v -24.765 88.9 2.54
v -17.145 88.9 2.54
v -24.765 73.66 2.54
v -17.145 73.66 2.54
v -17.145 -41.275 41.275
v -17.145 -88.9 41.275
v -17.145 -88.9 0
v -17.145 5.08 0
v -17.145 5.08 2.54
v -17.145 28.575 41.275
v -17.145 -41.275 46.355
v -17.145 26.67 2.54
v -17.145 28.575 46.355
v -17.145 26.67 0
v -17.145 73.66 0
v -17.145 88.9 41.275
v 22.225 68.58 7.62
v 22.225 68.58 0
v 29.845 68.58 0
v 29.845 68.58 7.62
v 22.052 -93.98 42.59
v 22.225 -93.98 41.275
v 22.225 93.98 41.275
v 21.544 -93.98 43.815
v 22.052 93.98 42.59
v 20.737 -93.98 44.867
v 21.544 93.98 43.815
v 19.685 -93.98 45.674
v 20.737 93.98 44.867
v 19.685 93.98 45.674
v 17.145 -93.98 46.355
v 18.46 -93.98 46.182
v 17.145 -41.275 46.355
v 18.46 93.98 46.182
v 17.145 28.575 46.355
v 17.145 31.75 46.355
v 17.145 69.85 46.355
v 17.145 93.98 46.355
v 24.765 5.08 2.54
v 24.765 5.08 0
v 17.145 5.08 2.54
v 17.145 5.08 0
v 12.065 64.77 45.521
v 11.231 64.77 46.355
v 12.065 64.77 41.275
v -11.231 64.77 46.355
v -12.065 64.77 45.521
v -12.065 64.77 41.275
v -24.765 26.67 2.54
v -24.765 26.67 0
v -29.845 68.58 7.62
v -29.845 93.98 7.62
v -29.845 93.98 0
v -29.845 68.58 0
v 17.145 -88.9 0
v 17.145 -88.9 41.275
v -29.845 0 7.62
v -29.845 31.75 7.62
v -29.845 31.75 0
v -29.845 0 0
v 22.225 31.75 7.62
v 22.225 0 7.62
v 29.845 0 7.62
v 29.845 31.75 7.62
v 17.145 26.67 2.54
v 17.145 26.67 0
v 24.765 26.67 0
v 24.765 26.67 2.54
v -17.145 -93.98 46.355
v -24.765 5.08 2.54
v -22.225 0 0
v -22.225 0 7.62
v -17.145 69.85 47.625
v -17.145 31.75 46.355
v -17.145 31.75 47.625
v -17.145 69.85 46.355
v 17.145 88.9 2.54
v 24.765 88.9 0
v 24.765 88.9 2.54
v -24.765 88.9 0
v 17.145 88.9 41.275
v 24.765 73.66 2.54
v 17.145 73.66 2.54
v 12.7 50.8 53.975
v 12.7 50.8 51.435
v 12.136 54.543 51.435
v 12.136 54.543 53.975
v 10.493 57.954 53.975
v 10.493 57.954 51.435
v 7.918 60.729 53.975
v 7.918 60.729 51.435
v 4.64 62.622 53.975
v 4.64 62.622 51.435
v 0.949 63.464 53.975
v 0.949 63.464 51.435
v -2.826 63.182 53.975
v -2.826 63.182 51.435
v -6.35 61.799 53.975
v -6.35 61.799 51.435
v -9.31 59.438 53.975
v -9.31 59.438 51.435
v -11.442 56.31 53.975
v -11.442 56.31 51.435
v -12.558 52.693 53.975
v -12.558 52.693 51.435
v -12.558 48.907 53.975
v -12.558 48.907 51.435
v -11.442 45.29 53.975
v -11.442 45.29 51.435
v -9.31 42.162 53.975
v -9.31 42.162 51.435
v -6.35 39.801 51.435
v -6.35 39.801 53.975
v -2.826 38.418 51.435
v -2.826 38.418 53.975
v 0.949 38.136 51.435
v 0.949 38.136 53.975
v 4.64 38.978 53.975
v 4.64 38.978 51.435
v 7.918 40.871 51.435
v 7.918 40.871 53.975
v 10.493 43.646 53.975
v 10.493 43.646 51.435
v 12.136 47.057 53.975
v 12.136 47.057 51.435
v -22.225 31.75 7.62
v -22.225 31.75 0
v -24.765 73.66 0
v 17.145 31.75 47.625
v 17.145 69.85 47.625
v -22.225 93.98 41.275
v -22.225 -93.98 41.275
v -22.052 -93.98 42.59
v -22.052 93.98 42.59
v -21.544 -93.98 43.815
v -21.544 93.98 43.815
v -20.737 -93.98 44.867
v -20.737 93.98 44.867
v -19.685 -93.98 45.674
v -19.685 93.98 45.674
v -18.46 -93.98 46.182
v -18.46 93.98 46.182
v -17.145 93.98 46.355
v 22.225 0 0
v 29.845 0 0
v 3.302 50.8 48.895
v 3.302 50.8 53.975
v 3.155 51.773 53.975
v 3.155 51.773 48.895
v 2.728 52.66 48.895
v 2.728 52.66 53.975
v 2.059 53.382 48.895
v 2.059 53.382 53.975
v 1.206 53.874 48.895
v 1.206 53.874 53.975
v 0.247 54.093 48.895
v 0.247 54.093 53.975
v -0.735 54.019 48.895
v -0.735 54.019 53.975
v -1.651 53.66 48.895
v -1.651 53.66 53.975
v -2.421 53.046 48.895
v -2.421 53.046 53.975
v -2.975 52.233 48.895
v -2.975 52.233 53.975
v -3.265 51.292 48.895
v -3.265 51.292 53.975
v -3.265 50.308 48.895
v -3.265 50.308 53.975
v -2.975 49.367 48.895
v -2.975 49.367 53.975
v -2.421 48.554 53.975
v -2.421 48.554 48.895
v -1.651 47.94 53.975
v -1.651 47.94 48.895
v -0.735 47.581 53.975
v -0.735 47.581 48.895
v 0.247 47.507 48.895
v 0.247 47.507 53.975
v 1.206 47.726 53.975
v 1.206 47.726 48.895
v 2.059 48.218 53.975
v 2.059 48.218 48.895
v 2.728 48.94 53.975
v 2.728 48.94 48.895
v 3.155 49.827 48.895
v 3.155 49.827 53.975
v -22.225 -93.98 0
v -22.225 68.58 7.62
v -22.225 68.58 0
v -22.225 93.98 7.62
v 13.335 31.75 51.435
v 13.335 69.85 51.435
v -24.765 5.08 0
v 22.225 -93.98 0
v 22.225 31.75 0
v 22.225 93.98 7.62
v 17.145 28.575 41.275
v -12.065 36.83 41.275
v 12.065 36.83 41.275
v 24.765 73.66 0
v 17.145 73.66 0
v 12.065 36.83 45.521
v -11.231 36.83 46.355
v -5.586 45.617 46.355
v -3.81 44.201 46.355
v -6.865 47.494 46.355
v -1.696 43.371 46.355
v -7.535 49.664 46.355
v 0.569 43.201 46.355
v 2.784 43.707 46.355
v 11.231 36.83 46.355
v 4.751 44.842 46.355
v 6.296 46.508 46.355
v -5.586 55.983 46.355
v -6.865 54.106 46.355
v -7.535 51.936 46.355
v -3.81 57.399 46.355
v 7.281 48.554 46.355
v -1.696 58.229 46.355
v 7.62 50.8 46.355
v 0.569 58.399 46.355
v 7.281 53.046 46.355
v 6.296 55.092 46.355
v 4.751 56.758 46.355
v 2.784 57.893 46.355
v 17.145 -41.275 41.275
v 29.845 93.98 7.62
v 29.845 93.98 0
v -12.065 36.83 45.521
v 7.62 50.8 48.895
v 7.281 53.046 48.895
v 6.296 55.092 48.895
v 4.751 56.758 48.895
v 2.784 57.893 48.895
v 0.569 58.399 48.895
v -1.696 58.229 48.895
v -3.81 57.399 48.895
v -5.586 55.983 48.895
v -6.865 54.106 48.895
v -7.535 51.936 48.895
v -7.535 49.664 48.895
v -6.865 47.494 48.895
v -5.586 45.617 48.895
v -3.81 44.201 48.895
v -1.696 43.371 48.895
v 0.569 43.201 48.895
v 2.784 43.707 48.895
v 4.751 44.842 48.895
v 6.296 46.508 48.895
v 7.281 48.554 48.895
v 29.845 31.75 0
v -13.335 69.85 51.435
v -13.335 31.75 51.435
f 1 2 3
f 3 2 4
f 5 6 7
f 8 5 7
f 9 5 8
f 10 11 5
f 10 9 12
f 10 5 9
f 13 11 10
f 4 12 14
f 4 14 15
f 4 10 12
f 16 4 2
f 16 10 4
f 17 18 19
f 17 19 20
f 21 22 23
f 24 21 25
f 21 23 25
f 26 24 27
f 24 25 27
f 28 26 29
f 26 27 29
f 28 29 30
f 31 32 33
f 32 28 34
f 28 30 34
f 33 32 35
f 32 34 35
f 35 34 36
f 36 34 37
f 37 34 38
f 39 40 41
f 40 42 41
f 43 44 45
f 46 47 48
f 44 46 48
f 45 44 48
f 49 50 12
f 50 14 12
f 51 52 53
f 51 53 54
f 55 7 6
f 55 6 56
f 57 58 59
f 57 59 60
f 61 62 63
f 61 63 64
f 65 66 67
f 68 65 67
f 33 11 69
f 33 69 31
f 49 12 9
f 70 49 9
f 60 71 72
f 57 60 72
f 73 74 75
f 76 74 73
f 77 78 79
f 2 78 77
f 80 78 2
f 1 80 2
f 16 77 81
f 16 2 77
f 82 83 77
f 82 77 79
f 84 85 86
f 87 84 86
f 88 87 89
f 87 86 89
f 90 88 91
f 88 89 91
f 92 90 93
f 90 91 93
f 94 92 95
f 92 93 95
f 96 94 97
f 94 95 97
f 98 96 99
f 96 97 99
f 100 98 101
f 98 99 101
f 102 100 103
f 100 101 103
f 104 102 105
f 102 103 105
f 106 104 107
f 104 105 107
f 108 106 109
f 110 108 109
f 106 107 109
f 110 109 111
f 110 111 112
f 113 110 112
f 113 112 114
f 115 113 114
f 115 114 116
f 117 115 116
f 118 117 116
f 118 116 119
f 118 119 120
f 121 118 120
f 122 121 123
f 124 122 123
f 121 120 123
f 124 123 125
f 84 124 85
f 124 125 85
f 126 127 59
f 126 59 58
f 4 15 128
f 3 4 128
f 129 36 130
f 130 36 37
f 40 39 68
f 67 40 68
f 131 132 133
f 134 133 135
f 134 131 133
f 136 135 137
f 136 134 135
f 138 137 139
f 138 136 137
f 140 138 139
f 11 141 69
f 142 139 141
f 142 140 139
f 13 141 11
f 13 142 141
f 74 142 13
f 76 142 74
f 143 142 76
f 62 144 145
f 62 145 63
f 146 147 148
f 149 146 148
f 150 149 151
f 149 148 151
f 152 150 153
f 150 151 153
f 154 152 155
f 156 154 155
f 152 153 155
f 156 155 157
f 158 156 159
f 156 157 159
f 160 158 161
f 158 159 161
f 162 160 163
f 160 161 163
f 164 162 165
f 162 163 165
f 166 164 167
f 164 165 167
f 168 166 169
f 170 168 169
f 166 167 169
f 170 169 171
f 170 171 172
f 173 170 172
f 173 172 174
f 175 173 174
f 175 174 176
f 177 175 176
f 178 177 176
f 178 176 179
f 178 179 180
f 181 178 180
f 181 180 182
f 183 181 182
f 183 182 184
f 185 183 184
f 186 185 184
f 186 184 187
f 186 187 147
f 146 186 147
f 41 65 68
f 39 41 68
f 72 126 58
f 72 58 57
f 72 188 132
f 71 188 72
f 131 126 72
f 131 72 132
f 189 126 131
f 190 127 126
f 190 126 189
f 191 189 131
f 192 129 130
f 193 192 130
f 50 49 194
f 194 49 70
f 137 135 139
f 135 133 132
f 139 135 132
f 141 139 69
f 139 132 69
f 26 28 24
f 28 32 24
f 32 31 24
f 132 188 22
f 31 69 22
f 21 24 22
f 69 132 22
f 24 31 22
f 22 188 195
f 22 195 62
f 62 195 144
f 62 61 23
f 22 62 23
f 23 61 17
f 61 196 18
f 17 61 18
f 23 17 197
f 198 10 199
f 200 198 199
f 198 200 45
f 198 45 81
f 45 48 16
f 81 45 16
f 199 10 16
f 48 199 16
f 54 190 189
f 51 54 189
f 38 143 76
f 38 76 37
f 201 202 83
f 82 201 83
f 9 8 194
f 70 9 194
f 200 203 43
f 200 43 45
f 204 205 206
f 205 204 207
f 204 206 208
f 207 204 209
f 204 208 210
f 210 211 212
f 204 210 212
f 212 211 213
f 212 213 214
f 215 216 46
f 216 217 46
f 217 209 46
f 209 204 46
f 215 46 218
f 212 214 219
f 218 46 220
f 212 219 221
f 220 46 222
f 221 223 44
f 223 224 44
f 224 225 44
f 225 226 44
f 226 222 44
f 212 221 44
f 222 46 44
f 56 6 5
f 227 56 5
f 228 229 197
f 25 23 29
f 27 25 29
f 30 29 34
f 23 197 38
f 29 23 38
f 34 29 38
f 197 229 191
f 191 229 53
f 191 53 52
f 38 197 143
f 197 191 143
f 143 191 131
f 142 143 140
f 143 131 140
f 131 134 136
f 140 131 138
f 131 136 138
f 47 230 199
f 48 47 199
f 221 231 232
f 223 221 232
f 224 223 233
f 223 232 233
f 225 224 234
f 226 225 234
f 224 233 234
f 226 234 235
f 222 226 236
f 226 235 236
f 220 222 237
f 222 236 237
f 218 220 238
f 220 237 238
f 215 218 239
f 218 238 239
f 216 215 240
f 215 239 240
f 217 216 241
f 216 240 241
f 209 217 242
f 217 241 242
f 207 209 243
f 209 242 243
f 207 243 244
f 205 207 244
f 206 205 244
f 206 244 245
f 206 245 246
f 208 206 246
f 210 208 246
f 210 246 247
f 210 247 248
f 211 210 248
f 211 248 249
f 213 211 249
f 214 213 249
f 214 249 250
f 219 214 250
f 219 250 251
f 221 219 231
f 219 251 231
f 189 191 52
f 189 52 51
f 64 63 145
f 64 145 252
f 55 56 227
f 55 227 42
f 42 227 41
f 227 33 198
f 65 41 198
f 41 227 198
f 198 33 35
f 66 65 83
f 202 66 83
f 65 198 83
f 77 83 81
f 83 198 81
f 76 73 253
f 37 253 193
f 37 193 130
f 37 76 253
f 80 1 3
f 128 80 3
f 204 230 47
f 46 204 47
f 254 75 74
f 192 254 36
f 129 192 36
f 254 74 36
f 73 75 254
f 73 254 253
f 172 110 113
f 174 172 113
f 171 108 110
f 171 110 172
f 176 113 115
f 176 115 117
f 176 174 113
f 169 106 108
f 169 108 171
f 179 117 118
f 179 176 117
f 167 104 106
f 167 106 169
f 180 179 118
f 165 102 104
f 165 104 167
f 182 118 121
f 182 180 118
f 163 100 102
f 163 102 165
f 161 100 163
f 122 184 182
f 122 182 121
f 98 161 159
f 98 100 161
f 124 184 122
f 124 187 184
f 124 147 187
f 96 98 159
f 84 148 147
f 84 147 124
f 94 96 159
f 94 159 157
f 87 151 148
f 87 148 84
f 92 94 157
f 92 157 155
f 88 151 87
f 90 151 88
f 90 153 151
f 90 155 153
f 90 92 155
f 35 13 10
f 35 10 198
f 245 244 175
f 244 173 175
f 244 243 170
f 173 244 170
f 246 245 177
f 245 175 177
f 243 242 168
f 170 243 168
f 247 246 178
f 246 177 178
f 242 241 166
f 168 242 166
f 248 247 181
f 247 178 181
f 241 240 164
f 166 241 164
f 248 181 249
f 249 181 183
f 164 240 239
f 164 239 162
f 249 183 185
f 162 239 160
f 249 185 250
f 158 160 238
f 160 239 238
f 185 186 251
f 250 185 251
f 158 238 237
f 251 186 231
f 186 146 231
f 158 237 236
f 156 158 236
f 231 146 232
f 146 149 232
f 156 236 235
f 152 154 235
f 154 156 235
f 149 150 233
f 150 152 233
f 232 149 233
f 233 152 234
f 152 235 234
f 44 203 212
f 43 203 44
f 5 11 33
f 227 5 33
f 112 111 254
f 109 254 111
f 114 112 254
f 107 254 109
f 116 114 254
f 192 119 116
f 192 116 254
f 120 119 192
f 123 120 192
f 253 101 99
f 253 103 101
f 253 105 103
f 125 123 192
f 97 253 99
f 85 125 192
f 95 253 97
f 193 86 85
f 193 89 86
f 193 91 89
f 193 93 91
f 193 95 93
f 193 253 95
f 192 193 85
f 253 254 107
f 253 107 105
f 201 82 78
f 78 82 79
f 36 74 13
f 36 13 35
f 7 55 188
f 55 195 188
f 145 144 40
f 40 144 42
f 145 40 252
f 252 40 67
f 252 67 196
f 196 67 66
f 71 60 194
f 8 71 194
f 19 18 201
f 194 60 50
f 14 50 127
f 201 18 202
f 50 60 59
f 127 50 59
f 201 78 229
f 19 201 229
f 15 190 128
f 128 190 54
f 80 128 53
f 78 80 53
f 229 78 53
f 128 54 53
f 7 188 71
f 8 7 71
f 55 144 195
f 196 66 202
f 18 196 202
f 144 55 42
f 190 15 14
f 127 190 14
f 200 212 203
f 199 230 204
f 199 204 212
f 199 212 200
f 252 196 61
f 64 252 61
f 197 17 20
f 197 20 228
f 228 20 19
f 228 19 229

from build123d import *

# Parameters (mm, degrees)
F0_W          = 44.45
F0_H          = 187.96
F1_DEPTH      = 46.355
F2_R          = 5.08
F3_W          = 34.29
F3_H          = 38.1
F4_DEPTH      = 5.08
F5_R          = 12.7
F6_DEPTH      = 2.54
F7_W          = 31.75
F7_H          = 7.62
F8_DEPTH      = 7.62
F9_W          = 31.75
F9_H          = 7.62
F10_DEPTH     = 7.62
F11_W         = 25.4
F11_H         = 7.62
F12_DEPTH     = 7.62
F13_W         = 25.4
F13_H         = 7.62
F14_DEPTH     = 7.62
F15_SIZE      = 3.81
F16_T         = 5.08
F16_T3_DEPTH  = 44.45
F16_T5_DEPTH  = 48.26
F16_T7_DEPTH  = 35.56
F16_T9_DEPTH  = 17.78
F16_T11_DEPTH = 41.91
F17_W         = 34.29
F17_H         = 69.85
F18_DEPTH     = 25.4
F19_R         = 3.302
F20_DEPTH     = 53.976


# Not quite as in the source:
# - a shell that OpenCascade refuses in one call is made with other operations: the cavity is built on its own and cut out


with BuildPart() as f1:
    # F0 (on Top) → F1 (new body)
    with BuildSketch(Plane.XY):
        Rectangle(F0_W, F0_H)
    extrude(amount=F1_DEPTH)

    # F2
    f2_edges = [f1.edges().sort_by_distance(p)[0] for p in [
        (22.225, 0, 46.355),
        (-22.225, 0, 46.355),
    ]]
    fillet(f2_edges, radius=F2_R)

    # F3 (on face) → F4 (join)
    with BuildSketch(Plane.XY.offset(46.355)):
        with Locations((0, 50.8)):
            Rectangle(F3_W, F3_H)
    extrude(amount=F4_DEPTH)

    # F5 (on face) → F6 (join)
    with BuildSketch(Plane.XY.offset(51.435)):
        with Locations((0, 50.8)):
            Circle(F5_R)
    extrude(amount=F6_DEPTH)

    # F7 (on face) → F8 (join)
    with BuildSketch(Plane.YZ.offset(22.225)):
        with Locations((15.875, 3.81)):
            Rectangle(F7_W, F7_H)
    extrude(amount=F8_DEPTH)

    # F9 (on face) → F10 (join)
    with BuildSketch(Plane(origin=(-22.225, 0, 0), x_dir=(0, -1, 0), z_dir=(-1, 0, 0))):
        with Locations((-15.875, 3.81)):
            Rectangle(F9_W, F9_H)
    extrude(amount=F10_DEPTH)

    # F11 (on face) → F12 (join)
    with BuildSketch(Plane(origin=(-22.225, 0, 0), x_dir=(0, -1, 0), z_dir=(-1, 0, 0))):
        with Locations((-81.28, 3.81)):
            Rectangle(F11_W, F11_H)
    extrude(amount=F12_DEPTH)

    # F13 (on face) → F14 (join)
    with BuildSketch(Plane.YZ.offset(22.225)):
        with Locations((81.28, 3.81)):
            Rectangle(F13_W, F13_H)
    extrude(amount=F14_DEPTH)

    # F15
    f15_edges = [f1.edges().sort_by_distance(p)[0] for p in [
        (-17.145, 50.8, 51.435),
        (17.145, 50.8, 51.435),
    ]]
    chamfer(f15_edges, length=F15_SIZE)

    # F16: shell of thickness 5.08, made by hand


with BuildPart() as f16_core1:
    # F16_t2: copy of F1
    add(f1.part)

    # the walls: a layer under each face that stays
    f16_faces = [f16_core1.faces().sort_by_distance(p)[0] for p in [
        (0, 31.75, 48.895),
        (-17.145, 50.8, 46.99),
        (-15.24, 50.8, 49.53),
        (0, -31.115, 46.355),
        (-8.89, 38.1, 51.435),
        (17.145, 50.8, 46.99),
        (15.24, 50.8, 49.53),
        (0, 69.85, 48.895),
        (0, -93.98, 23.1775),
        (-12.7, 50.8, 52.705),
        (0, 81.915, 46.355),
        (0, 93.98, 23.1775),
        (-22.225, 0, 20.6375),
        (22.225, 0, 20.6375),
        (0, 50.8, 53.975),
        (-26.035, 81.28, 7.62),
        (-29.845, 81.28, 3.81),
        (29.845, 81.28, 3.81),
        (26.035, 81.28, 7.62),
        (-26.035, 68.58, 3.81),
        (-26.035, 31.75, 3.81),
        (-26.035, 15.875, 7.62),
        (-26.035, 0, 3.81),
        (26.035, 0, 3.81),
        (26.035, 15.875, 7.62),
        (26.035, 31.75, 3.81),
        (26.035, 68.58, 3.81),
        (-29.845, 15.875, 3.81),
        (29.845, 15.875, 3.81),
    ]]
    thicken(f16_faces, amount=-F16_T, mode=Mode.SUBTRACT)

    # F16_s4 → F16_t3 (cut)
    with BuildSketch(Plane.YZ.offset(-22.225)):
        Polygon((31.6992, 46.4058), (36.83, 46.355), (36.83, 41.275), (31.75, 41.275), align=None)
        Polygon((69.9008, 46.4058), (64.77, 46.355), (64.77, 41.275), (69.85, 41.275), align=None)
    extrude(amount=F16_T3_DEPTH, mode=Mode.SUBTRACT)

    # F16_s6 → F16_t5 (cut)
    with BuildSketch(Plane.XZ.offset(-74.93)):
        Polygon((-17.1958, 46.4058), (-12.065, 46.355), (-12.065, 41.275), (-17.145, 41.275), align=None)
        Polygon((17.1958, 46.4058), (12.065, 46.355), (12.065, 41.275), (17.145, 41.275), align=None)
    extrude(amount=F16_T5_DEPTH, mode=Mode.SUBTRACT)

    # F16_s8 → F16_t7 (cut)
    with BuildSketch(Plane.XZ.offset(-99.06)):
        Polygon((-22.2758, 7.6708), (-17.145, 7.62), (-17.145, 2.54), (-22.225, 2.54), align=None)
        Polygon((22.2758, 7.6708), (17.145, 7.62), (17.145, 2.54), (22.225, 2.54), align=None)
    extrude(amount=F16_T7_DEPTH, mode=Mode.SUBTRACT)

    # F16_s10 → F16_t9 (cut)
    with BuildSketch(Plane.XY.offset(-5.08)):
        Polygon((-22.2758, 68.5292), (-17.145, 68.58), (-17.145, 73.66), (-22.225, 73.66), align=None)
        Polygon((-22.2758, 31.8008), (-17.145, 31.75), (-17.145, 26.67), (-22.225, 26.67), align=None)
        Polygon((-22.2758, -0.0508), (-17.145, 0), (-17.145, 5.08), (-22.225, 5.08), align=None)
        Polygon((22.2758, -0.0508), (17.145, 0), (17.145, 5.08), (22.225, 5.08), align=None)
        Polygon((22.2758, 31.8008), (17.145, 31.75), (17.145, 26.67), (22.225, 26.67), align=None)
        Polygon((22.2758, 68.5292), (17.145, 68.58), (17.145, 73.66), (22.225, 73.66), align=None)
    extrude(amount=F16_T9_DEPTH, mode=Mode.SUBTRACT)

    # F16_s12 → F16_t11 (cut)
    with BuildSketch(Plane.XZ.offset(-36.83)):
        Polygon((-22.2758, 7.6708), (-17.145, 7.62), (-17.145, 2.54), (-22.225, 2.54), align=None)
        Polygon((22.2758, 7.6708), (17.145, 7.62), (17.145, 2.54), (22.225, 2.54), align=None)
    extrude(amount=F16_T11_DEPTH, mode=Mode.SUBTRACT)

    # F16_s13 → F16_t14 (revolve, cut)
    with BuildSketch(Plane.XZ.offset(-50.8)):
        Polygon((12.7508, 51.4858), (12.7, 46.355), (7.62, 46.355), (7.62, 51.435), align=None)
    revolve(axis=Axis((0, 50.8, 51.435), (0, 0, 1)), mode=Mode.SUBTRACT)


with BuildPart() as f1_1:
    add(f1.part)

    # what is left inside the walls is the cavity
    f16_cavity = [f16_core1.part.solids().sort_by_distance(p)[0] for p in [
        (17.0942, 0, 27.516667),
    ]]
    add(f16_cavity, mode=Mode.SUBTRACT)

    # F17 (on face) → F18 (cut)
    with BuildSketch(Plane.XY.offset(46.355)):
        with Locations((0, -6.35)):
            Rectangle(F17_W, F17_H)
    extrude(amount=-F18_DEPTH, mode=Mode.SUBTRACT)

    # F19 (on face) → F20 (cut, through all)
    with BuildSketch(Plane.XY.offset(53.975)):
        with Locations((0, 50.8)):
            Circle(F19_R)
    extrude(amount=-F20_DEPTH, mode=Mode.SUBTRACT)


solid = f1_1.part
